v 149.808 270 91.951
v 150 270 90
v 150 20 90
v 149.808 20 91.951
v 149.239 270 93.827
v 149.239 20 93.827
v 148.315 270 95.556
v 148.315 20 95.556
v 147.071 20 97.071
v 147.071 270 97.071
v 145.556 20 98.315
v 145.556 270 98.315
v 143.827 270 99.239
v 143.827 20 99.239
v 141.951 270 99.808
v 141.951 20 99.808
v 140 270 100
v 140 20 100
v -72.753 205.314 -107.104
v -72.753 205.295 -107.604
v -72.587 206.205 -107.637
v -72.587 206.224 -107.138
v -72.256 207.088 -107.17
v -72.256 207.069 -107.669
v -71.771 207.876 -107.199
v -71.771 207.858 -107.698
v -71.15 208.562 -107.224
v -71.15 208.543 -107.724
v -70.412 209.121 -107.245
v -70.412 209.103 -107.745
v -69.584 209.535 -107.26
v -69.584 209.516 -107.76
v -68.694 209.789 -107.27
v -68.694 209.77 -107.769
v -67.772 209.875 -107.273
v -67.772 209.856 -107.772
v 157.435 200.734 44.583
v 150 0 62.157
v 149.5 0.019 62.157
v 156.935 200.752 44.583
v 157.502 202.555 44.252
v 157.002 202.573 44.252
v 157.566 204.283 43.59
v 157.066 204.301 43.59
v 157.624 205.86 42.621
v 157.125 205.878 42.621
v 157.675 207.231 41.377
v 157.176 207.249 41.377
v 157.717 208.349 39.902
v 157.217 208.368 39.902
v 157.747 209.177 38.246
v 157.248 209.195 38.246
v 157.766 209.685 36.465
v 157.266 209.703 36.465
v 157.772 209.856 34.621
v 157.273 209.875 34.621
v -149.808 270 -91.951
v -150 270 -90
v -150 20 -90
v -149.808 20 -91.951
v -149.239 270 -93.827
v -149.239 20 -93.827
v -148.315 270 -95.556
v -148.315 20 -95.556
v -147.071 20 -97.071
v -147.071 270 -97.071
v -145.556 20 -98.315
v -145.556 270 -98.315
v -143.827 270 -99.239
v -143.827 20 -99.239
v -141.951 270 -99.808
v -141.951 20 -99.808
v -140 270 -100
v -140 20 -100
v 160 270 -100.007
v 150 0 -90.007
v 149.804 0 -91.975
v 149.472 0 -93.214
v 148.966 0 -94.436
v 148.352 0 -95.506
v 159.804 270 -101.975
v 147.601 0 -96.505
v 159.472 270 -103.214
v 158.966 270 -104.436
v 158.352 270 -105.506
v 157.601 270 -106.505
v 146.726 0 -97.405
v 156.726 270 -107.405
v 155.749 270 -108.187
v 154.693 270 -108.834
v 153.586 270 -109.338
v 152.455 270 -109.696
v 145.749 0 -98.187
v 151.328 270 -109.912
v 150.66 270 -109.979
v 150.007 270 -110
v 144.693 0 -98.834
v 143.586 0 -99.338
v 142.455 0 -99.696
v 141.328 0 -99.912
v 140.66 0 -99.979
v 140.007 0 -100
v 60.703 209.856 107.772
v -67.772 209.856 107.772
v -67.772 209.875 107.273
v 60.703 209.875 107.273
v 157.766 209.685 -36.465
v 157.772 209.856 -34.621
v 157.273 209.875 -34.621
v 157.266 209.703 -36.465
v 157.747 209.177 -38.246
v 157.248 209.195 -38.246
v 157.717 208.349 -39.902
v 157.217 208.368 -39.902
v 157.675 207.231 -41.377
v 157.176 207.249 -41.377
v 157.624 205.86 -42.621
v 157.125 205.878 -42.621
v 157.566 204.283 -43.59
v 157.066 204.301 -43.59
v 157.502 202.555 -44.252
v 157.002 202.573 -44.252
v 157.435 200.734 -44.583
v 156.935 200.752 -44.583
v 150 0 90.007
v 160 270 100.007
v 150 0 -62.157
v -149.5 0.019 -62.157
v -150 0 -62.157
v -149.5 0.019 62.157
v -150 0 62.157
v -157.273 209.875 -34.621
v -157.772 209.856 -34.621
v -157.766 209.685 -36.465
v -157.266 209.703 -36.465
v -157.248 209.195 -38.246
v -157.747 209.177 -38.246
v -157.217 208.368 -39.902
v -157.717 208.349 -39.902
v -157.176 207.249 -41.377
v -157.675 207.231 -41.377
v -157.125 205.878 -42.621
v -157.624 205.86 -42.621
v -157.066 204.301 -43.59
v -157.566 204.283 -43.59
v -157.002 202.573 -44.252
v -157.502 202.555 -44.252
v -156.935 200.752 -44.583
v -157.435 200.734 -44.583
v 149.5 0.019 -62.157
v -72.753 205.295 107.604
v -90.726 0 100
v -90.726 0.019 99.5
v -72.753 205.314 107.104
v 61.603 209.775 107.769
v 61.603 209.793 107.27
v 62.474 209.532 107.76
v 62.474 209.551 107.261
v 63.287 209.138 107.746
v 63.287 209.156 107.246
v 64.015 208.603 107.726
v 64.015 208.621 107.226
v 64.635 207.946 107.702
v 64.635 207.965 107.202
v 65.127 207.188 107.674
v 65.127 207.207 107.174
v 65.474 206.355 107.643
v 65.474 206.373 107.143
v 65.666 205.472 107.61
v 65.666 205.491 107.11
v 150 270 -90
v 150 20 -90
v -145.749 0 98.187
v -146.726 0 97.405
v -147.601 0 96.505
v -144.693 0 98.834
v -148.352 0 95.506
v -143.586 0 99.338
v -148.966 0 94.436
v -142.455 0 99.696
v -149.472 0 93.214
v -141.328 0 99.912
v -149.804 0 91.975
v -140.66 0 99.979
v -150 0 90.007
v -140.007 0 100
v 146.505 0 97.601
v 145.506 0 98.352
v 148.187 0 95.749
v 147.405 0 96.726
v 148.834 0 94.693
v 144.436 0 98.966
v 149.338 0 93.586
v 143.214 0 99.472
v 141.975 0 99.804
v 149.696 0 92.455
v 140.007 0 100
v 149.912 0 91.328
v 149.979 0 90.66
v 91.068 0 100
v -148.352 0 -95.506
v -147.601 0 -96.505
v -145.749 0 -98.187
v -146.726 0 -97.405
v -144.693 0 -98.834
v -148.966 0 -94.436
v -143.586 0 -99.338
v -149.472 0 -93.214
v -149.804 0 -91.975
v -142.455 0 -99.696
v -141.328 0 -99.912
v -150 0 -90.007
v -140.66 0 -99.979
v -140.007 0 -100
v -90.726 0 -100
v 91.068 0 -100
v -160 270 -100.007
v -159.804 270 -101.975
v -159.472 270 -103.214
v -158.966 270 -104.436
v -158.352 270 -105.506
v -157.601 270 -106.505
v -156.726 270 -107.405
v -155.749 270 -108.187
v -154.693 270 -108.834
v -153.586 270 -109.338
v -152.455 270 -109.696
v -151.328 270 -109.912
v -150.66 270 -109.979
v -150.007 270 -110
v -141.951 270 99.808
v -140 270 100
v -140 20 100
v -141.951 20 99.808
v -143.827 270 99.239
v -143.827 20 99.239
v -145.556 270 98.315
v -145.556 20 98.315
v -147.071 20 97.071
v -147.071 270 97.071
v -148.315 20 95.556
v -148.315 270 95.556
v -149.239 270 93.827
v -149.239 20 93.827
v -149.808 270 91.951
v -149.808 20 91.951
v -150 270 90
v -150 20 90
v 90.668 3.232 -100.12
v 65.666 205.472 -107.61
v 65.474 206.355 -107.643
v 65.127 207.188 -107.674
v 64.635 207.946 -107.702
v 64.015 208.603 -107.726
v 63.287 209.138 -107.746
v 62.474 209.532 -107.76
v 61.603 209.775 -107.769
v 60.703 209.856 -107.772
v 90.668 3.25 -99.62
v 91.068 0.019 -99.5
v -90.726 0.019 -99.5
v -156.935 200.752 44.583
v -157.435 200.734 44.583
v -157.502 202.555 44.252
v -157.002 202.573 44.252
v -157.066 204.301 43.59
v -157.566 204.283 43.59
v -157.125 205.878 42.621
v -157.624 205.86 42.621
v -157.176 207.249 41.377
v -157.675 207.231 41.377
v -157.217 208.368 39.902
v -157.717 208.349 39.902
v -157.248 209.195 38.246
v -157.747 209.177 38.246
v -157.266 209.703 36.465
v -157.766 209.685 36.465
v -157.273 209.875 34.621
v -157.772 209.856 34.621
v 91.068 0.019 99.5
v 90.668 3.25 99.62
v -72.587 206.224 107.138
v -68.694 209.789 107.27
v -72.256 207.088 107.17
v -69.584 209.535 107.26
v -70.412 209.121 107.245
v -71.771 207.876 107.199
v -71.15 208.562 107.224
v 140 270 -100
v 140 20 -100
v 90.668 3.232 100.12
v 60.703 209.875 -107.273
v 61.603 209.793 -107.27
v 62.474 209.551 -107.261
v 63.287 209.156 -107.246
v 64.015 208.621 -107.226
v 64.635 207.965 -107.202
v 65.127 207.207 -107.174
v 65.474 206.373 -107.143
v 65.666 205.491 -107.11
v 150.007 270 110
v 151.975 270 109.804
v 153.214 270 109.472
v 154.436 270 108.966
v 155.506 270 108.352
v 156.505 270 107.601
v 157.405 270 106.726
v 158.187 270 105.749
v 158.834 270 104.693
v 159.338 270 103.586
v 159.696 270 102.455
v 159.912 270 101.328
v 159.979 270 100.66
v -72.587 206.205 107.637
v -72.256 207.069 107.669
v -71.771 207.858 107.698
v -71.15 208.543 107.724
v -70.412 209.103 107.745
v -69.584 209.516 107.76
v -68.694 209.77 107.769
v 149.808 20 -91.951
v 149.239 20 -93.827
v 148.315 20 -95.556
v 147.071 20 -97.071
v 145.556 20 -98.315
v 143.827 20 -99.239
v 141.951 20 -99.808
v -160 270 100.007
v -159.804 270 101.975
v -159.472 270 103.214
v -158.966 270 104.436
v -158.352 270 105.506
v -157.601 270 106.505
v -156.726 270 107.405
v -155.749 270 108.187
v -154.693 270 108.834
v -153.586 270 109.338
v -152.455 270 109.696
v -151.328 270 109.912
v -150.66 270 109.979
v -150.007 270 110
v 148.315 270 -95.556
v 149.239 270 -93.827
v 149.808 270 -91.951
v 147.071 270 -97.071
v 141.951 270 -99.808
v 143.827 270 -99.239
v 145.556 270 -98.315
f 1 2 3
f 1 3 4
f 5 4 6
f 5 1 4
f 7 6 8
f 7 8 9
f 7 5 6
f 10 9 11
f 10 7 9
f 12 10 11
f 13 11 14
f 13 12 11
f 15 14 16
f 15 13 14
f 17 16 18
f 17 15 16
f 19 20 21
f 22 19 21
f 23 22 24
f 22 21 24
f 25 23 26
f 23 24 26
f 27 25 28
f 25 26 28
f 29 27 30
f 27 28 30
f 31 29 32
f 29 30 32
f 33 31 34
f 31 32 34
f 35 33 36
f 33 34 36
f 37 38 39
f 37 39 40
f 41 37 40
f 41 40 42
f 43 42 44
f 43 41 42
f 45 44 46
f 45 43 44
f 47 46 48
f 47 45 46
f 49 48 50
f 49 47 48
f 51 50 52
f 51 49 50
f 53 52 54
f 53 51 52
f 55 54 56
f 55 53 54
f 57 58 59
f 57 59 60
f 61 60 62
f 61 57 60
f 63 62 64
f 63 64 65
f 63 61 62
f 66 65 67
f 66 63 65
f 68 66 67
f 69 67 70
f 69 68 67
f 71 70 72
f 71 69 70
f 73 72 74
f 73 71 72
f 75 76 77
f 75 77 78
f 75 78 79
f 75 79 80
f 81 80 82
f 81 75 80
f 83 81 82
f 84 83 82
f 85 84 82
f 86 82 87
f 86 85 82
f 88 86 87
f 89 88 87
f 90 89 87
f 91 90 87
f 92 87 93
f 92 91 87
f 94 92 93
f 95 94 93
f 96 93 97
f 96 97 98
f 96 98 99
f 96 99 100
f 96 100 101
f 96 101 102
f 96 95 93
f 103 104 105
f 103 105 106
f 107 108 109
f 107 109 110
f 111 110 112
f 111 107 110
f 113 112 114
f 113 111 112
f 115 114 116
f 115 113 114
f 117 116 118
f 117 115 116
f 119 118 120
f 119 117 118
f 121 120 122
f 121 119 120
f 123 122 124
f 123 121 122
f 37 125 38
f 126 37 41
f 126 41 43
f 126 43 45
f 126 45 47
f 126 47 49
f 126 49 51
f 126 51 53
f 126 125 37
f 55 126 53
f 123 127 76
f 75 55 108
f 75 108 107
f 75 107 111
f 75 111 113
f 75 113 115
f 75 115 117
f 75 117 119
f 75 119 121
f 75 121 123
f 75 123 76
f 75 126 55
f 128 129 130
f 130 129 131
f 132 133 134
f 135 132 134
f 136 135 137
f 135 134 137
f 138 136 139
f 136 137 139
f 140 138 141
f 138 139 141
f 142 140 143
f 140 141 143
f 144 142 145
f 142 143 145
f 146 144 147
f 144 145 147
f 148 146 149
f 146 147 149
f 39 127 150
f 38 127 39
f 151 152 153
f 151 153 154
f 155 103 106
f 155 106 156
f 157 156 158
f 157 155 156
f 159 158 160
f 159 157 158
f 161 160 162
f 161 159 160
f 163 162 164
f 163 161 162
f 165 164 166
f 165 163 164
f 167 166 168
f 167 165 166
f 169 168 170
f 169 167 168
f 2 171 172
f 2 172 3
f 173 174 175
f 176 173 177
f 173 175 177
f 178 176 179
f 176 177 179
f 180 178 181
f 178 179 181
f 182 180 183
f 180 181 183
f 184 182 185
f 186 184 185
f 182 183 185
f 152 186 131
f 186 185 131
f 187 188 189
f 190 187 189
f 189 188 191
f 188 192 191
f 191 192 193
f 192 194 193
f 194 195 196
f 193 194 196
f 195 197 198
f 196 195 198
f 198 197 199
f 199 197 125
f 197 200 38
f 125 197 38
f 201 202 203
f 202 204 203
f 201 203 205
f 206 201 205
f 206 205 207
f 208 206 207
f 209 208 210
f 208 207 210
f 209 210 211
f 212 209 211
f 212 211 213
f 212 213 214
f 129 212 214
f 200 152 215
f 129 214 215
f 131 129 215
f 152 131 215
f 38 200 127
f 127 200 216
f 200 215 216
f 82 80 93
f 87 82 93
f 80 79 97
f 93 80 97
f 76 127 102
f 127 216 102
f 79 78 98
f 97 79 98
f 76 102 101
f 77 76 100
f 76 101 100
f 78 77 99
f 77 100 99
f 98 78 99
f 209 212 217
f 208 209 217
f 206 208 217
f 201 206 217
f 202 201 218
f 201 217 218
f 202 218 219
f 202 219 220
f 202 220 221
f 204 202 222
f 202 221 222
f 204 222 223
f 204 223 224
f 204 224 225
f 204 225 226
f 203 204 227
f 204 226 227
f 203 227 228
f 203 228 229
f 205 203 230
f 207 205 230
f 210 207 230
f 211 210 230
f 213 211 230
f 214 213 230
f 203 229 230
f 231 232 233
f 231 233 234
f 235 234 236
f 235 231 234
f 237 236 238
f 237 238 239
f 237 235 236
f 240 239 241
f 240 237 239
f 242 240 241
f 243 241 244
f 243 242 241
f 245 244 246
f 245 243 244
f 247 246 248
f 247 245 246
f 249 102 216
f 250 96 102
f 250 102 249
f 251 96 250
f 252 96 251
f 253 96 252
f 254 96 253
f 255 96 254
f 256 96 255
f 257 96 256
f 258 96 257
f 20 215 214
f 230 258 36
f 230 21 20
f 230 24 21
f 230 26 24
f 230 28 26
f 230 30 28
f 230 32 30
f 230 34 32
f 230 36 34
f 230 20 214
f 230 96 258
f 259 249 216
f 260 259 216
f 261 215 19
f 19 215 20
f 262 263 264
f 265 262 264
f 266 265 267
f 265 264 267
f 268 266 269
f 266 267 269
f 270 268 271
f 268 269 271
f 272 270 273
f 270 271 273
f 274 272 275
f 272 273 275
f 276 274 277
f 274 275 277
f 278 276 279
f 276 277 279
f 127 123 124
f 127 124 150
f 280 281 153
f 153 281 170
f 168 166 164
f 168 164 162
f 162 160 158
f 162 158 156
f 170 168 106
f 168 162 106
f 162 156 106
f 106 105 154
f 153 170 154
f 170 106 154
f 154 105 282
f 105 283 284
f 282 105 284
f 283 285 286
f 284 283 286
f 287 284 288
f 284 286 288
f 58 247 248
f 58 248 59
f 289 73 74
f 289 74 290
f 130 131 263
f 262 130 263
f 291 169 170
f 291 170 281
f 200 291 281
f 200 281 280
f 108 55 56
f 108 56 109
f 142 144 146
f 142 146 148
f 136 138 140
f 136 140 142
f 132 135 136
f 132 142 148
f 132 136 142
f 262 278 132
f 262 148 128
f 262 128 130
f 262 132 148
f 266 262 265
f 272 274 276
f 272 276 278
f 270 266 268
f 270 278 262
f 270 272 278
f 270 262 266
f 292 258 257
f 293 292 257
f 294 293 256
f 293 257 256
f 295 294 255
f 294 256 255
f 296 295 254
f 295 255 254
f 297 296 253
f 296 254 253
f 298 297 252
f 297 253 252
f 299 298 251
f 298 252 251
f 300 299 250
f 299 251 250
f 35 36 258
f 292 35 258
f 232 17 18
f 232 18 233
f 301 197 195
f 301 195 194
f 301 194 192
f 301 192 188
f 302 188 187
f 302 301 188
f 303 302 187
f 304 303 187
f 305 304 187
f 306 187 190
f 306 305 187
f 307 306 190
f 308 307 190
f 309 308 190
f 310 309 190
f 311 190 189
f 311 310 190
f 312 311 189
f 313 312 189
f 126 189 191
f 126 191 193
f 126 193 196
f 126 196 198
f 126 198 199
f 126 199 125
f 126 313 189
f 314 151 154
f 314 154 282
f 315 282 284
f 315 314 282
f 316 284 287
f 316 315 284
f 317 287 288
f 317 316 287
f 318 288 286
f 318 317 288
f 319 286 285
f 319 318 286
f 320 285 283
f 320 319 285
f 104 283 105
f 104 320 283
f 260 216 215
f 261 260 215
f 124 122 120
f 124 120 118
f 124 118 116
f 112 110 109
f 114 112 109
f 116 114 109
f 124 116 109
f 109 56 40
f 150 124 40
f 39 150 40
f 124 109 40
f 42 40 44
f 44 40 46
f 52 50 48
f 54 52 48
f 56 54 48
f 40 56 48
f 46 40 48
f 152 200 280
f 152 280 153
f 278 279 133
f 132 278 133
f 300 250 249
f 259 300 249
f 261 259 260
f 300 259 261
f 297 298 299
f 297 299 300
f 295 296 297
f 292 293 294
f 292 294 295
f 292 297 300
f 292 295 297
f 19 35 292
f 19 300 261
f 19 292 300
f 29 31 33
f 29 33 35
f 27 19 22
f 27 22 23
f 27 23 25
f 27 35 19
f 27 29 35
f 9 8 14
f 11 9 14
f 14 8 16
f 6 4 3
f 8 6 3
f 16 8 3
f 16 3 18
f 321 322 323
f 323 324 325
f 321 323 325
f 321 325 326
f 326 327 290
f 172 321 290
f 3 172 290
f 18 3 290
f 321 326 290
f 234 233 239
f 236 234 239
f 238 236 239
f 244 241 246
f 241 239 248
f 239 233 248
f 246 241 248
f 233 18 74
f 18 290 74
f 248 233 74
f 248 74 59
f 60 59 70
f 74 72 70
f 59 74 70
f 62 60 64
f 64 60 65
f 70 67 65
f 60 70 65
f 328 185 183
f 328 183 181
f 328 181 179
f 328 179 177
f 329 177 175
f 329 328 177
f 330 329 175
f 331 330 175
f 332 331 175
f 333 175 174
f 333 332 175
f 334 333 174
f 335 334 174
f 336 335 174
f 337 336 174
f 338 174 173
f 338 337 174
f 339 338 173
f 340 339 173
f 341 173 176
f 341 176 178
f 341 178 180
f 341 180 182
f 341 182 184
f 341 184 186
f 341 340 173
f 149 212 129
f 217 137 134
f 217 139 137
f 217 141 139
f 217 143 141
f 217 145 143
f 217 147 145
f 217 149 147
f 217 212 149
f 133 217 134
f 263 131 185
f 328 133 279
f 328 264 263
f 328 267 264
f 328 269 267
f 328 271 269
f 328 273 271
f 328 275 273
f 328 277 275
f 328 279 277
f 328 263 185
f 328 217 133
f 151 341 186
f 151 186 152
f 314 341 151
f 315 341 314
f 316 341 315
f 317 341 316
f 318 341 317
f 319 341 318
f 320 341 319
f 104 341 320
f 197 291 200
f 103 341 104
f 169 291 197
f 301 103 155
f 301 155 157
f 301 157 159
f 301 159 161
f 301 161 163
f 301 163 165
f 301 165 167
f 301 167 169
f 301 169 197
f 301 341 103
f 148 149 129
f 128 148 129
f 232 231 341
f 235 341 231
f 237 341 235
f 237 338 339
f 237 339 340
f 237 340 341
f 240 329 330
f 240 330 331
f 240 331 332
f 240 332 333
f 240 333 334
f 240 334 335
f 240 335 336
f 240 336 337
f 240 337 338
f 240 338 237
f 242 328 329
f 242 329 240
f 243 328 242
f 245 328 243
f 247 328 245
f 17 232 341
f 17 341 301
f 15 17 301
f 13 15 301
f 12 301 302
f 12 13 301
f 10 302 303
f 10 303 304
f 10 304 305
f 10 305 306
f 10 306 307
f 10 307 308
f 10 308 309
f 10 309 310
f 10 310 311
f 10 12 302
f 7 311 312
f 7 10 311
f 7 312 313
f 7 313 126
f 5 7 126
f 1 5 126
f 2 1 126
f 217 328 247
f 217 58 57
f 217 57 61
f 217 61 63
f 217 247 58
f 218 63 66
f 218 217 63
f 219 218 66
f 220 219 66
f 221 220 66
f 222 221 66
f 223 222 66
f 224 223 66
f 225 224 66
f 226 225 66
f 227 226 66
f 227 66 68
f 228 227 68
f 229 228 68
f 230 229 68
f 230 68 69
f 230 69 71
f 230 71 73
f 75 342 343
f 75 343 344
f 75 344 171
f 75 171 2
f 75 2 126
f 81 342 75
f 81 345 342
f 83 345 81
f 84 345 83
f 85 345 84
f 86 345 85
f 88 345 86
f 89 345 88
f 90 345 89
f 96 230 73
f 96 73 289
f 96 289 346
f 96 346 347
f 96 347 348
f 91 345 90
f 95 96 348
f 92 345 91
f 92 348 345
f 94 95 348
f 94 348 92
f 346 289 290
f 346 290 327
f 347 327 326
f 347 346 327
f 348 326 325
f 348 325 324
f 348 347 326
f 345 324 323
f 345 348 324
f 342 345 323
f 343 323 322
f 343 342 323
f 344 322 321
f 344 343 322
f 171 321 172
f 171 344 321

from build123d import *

# Parameters (mm, degrees)
SKETCH1_W          = 300
SKETCH1_H          = 200
SKETCH2_W          = 320
SKETCH2_H          = 220
FILLET1_R          = 10
CUT_EXTRUDE1_DEPTH = 250
CUT_EXTRUDE3_DEPTH = 0.5
CUT_EXTRUDE4_DEPTH = 0.5


with BuildPart() as part:
    # Sketch1 → Loft1 section 0
    with BuildSketch(Plane(origin=(0, 0, 0), x_dir=(1, 0, 0), z_dir=(0, 1, 0))):
        Rectangle(SKETCH1_W, SKETCH1_H)
    # Sketch2 → Loft1 section 1
    with BuildSketch(Plane(origin=(0, 270, 0), x_dir=(1, 0, 0), z_dir=(0, 1, 0))):
        Rectangle(SKETCH2_W, SKETCH2_H)
    loft()

    # Fillet1
    fillet1_edges = [part.edges().sort_by_distance(p)[0] for p in [
        (155, 135, -105),
        (155, 135, 105),
        (-155, 135, 105),
        (-155, 135, -105),
    ]]
    fillet(fillet1_edges, radius=FILLET1_R)

    # Sketch3 → Cut-Extrude1 (cut)
    with BuildSketch(Plane(origin=(0, 270, 0), x_dir=(1, 0, 0), z_dir=(0, 1, 0))):
        with BuildLine():
            Line((-140, 100), (140, 100))
            ThreePointArc((140, 100), (147.071067812, 97.071067812), (150, 90))
            Line((150, 90), (150, -90))
            ThreePointArc((150, -90), (147.071067812, -97.071067812), (140, -100))
            Line((140, -100), (-140, -100))
            ThreePointArc((-140, -100), (-147.071067812, -97.071067812), (-150, -90))
            Line((-150, -90), (-150, 90))
            ThreePointArc((-150, 90), (-147.071067812, 97.071067812), (-140, 100))
        make_face()
    extrude(amount=-CUT_EXTRUDE1_DEPTH, mode=Mode.SUBTRACT)

    # Sketch4 → Cut-Extrude3 (cut)
    with BuildSketch(Plane(origin=(0, -3.698630137, 99.863013699), x_dir=(1, 0, 0), z_dir=(0, -0.037011661, 0.999314834))):
        with BuildLine():
            Line((-90.72593498, 3.701166051), (-72.75263326, 209.136944765))
            ThreePointArc((-72.75263326, 209.136944765), (-71.149610808, 212.387552735), (-67.77165977, 213.701166051))
            Line((-67.77165977, 213.701166051), (60.703357415, 213.701166051))
            ThreePointArc((60.703357415, 213.701166051), (64.015057291, 212.447183126), (65.665631129, 209.314223623))
            Line((65.665631129, 209.314223623), (90.668274157, 6.935256238))
            Line((90.668274157, 6.935256238), (91.067825571, 3.701166051))
            Line((91.067825571, 3.701166051), (-90.72593498, 3.701166051))
        make_face()
    cut_extrude3 = extrude(amount=-CUT_EXTRUDE3_DEPTH, mode=Mode.SUBTRACT)

    # Mirror1: Cut-Extrude3 across plane
    add(cut_extrude3.mirror(Plane.XY), mode=Mode.SUBTRACT)

    # Sketch5 → Cut-Extrude4 (cut)
    with BuildSketch(Plane(origin=(149.794520548, -5.547945205, 0), x_dir=(0, 0, -1), z_dir=(0.999314834, -0.037011661, 0))):
        with BuildLine():
            Line((-62.157161102, 5.551749076), (-44.583177002, 206.423306504))
            ThreePointArc((-44.583177002, 206.423306504), (-41.377132097, 212.924522445), (-34.621230021, 215.551749076))
            Line((-34.621230021, 215.551749076), (34.621230021, 215.551749076))
            ThreePointArc((34.621230021, 215.551749076), (41.377132097, 212.924522445), (44.583177002, 206.423306504))
            Line((44.583177002, 206.423306504), (62.157161102, 5.551749076))
            Line((62.157161102, 5.551749076), (-62.157161102, 5.551749076))
        make_face()
    cut_extrude4 = extrude(amount=-CUT_EXTRUDE4_DEPTH, mode=Mode.SUBTRACT)

    # Mirror2: Cut-Extrude4 across plane
    add(cut_extrude4.mirror(Plane(origin=(0, 0, 0), x_dir=(0, 0, 1), z_dir=(1, 0, 0))), mode=Mode.SUBTRACT)


solid = part.part
